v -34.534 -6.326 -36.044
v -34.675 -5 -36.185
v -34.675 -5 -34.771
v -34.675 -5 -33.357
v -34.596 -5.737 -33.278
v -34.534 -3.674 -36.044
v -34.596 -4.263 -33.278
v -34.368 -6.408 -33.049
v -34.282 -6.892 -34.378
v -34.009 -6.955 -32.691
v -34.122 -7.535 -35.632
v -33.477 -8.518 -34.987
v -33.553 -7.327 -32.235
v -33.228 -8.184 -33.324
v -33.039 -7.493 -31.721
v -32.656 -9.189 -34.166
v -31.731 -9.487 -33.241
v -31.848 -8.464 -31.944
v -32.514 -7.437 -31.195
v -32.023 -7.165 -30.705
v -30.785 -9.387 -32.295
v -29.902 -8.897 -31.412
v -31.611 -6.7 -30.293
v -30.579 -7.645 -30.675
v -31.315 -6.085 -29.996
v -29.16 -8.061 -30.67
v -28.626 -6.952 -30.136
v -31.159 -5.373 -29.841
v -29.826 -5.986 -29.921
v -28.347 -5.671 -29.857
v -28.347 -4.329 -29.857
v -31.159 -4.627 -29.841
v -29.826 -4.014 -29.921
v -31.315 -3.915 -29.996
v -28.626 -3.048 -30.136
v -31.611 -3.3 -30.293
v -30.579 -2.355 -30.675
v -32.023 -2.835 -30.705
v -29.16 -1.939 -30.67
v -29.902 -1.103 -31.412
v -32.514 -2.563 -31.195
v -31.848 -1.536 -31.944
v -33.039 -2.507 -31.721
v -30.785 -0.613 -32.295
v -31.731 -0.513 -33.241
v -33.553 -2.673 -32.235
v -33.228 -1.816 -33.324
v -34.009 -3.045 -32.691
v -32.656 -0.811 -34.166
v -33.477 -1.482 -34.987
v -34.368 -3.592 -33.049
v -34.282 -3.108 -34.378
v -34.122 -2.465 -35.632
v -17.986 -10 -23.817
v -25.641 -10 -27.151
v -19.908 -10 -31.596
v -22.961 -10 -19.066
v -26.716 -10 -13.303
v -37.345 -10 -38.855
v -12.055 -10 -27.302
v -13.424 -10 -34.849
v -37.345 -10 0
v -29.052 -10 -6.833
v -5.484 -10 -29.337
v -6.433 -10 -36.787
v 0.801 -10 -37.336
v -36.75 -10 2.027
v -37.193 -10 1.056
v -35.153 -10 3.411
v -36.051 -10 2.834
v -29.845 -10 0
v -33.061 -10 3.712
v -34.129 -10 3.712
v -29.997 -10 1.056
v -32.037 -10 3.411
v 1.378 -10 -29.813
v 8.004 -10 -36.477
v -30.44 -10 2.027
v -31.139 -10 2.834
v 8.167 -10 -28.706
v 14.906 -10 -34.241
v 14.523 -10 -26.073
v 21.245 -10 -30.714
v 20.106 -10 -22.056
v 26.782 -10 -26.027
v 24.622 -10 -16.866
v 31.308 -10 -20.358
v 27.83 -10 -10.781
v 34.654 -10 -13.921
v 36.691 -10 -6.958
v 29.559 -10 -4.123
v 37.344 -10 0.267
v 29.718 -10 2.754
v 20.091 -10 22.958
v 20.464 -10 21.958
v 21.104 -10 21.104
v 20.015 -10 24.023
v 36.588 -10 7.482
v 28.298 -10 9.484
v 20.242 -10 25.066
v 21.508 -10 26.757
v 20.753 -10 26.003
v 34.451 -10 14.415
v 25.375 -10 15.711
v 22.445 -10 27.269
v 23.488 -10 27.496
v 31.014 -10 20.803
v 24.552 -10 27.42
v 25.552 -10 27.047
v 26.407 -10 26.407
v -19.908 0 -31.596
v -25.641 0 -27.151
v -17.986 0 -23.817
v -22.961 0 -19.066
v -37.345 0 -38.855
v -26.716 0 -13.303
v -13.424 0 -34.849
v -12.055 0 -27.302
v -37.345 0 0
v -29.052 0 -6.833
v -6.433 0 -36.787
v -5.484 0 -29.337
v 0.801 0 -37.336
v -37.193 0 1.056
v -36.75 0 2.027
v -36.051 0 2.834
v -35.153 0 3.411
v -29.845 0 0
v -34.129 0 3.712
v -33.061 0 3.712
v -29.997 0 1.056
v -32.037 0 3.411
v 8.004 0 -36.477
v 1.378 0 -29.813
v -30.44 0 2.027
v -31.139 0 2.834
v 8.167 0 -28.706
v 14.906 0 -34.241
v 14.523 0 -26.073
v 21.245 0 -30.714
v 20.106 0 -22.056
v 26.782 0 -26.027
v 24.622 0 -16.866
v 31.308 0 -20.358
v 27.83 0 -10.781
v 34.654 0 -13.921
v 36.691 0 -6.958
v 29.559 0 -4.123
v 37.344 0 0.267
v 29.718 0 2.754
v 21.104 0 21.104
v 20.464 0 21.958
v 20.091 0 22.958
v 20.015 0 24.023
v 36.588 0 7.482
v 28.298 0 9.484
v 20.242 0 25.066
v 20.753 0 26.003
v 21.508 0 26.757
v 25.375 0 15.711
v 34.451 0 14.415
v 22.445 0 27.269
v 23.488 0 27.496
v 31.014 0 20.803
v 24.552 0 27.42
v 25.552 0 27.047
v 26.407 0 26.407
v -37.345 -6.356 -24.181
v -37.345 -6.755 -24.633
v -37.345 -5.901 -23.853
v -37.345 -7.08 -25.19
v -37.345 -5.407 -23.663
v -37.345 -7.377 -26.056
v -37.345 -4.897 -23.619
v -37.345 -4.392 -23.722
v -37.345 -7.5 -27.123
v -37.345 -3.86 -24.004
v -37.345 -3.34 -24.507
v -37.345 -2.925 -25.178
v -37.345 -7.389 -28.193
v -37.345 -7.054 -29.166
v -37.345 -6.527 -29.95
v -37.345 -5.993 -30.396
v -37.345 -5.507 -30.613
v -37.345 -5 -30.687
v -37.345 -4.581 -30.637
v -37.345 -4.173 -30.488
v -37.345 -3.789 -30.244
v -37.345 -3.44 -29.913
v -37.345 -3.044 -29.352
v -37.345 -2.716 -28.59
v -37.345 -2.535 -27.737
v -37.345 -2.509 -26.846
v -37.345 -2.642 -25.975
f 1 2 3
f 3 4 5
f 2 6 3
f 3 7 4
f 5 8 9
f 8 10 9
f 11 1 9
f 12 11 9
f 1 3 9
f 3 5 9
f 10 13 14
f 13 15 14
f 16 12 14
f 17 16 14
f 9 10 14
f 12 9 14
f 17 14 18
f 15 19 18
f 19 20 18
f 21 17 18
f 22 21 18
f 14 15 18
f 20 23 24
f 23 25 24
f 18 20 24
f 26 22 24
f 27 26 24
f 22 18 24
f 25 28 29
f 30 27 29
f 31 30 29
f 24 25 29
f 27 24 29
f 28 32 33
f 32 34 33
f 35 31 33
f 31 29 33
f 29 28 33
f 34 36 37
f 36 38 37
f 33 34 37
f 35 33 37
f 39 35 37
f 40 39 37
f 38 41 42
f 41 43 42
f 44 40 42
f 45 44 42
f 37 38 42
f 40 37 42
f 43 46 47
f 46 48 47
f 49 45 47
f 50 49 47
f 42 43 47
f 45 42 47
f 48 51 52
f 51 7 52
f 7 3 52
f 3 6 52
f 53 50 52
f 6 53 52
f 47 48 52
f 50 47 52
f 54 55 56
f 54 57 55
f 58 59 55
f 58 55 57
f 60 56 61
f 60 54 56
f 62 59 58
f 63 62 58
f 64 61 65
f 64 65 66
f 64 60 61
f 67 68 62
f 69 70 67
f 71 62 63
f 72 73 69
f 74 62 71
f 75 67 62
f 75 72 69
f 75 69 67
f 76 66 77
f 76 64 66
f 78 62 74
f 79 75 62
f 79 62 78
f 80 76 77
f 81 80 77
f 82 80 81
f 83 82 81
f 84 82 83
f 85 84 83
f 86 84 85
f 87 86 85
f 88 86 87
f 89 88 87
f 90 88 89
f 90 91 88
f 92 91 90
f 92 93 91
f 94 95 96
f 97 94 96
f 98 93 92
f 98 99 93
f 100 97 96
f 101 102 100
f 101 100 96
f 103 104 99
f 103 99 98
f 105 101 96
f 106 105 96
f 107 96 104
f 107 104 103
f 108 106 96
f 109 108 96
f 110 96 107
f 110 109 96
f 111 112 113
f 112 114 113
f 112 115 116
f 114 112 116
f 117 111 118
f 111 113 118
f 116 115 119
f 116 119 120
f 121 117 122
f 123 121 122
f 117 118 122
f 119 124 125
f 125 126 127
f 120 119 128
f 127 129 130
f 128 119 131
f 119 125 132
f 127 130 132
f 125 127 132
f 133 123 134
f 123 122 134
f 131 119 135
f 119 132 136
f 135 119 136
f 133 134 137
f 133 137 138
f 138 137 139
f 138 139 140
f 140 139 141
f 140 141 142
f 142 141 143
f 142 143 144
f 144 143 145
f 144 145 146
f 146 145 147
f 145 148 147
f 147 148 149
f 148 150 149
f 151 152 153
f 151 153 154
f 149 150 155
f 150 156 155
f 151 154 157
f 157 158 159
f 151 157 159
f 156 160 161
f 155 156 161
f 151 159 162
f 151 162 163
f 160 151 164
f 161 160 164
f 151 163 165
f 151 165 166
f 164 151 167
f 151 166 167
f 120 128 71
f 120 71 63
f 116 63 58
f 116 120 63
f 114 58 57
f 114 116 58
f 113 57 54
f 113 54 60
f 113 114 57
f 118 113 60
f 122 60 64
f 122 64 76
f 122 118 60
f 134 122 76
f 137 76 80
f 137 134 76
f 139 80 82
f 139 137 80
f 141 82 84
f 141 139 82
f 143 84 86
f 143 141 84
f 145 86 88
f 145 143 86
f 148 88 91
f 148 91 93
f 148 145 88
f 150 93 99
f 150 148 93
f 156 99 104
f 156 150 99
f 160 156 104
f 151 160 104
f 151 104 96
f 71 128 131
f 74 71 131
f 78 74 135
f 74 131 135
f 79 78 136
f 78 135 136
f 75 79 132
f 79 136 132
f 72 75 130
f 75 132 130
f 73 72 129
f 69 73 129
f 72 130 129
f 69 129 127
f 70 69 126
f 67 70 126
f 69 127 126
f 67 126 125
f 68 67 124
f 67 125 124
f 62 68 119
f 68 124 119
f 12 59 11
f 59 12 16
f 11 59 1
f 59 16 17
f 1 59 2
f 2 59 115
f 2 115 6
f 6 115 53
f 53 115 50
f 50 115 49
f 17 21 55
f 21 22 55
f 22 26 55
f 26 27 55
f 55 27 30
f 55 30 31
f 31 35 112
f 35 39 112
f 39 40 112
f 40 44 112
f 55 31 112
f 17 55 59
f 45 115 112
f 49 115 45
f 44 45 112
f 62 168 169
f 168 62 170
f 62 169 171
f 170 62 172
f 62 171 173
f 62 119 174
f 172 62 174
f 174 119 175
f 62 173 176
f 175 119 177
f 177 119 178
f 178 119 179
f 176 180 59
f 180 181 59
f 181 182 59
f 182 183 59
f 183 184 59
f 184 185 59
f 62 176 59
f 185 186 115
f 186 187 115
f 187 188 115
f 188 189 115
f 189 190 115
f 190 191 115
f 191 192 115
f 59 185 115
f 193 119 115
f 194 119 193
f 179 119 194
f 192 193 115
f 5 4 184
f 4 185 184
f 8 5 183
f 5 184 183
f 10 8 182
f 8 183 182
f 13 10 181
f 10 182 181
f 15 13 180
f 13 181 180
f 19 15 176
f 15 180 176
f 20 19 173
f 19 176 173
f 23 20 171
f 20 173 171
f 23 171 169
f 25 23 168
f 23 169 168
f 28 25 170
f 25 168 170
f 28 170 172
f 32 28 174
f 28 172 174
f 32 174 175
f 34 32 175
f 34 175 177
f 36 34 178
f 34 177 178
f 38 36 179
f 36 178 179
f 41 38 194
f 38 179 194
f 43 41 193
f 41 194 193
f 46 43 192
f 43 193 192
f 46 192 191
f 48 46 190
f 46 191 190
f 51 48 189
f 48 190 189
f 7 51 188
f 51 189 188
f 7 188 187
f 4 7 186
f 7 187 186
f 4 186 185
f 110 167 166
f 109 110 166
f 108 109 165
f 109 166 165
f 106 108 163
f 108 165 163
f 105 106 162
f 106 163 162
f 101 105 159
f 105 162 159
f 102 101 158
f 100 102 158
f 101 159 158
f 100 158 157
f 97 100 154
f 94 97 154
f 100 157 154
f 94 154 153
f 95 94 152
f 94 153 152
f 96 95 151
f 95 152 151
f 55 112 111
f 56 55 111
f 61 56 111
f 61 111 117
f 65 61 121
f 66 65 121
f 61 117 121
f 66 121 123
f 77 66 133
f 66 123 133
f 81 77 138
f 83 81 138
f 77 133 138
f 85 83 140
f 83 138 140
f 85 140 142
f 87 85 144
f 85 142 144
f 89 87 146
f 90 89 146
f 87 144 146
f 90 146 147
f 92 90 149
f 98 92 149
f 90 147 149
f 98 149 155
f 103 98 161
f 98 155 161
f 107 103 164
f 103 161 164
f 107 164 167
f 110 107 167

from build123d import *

# Parameters (mm, degrees)
PAD_DEPTH           = 10
HOLE001_D           = 5
HOLE001_DEPTH       = 195.23
HOLE001_CSINK_D     = 9
HOLE001_CSINK_ANGLE = 90


with BuildPart() as part:
    # Sketch → Pad (new body)
    with BuildSketch(Plane.XZ):
        with BuildLine():
            Line((-37.345, 0), (-37.345, -38.855))
            Line((-37.345, -38.855), (-25.641107, -27.151107))
            ThreePointArc((-25.641107, -27.151107), (26.781742, -26.026665), (26.406903, 26.406903))
            ThreePointArc((26.406903, 26.406903), (21.103602, 26.406903), (21.103602, 21.103602))
            ThreePointArc((-29.845, 0), (11.421187, -27.573185), (21.103602, 21.103602))
            ThreePointArc((-29.845, 0), (-33.595, 3.75), (-37.345, 0))
        make_face()
    extrude(amount=PAD_DEPTH)

    # Hole001
    with Locations(Plane(origin=(0.755, 0, -0.755), x_dir=(0.707107, 0, 0.707107), z_dir=(0.707107, 0, -0.707107))):
        with Locations((-45.605635, 5)):
            CounterSinkHole(HOLE001_D / 2, HOLE001_CSINK_D / 2, depth=HOLE001_DEPTH, counter_sink_angle=HOLE001_CSINK_ANGLE)


solid = part.part
